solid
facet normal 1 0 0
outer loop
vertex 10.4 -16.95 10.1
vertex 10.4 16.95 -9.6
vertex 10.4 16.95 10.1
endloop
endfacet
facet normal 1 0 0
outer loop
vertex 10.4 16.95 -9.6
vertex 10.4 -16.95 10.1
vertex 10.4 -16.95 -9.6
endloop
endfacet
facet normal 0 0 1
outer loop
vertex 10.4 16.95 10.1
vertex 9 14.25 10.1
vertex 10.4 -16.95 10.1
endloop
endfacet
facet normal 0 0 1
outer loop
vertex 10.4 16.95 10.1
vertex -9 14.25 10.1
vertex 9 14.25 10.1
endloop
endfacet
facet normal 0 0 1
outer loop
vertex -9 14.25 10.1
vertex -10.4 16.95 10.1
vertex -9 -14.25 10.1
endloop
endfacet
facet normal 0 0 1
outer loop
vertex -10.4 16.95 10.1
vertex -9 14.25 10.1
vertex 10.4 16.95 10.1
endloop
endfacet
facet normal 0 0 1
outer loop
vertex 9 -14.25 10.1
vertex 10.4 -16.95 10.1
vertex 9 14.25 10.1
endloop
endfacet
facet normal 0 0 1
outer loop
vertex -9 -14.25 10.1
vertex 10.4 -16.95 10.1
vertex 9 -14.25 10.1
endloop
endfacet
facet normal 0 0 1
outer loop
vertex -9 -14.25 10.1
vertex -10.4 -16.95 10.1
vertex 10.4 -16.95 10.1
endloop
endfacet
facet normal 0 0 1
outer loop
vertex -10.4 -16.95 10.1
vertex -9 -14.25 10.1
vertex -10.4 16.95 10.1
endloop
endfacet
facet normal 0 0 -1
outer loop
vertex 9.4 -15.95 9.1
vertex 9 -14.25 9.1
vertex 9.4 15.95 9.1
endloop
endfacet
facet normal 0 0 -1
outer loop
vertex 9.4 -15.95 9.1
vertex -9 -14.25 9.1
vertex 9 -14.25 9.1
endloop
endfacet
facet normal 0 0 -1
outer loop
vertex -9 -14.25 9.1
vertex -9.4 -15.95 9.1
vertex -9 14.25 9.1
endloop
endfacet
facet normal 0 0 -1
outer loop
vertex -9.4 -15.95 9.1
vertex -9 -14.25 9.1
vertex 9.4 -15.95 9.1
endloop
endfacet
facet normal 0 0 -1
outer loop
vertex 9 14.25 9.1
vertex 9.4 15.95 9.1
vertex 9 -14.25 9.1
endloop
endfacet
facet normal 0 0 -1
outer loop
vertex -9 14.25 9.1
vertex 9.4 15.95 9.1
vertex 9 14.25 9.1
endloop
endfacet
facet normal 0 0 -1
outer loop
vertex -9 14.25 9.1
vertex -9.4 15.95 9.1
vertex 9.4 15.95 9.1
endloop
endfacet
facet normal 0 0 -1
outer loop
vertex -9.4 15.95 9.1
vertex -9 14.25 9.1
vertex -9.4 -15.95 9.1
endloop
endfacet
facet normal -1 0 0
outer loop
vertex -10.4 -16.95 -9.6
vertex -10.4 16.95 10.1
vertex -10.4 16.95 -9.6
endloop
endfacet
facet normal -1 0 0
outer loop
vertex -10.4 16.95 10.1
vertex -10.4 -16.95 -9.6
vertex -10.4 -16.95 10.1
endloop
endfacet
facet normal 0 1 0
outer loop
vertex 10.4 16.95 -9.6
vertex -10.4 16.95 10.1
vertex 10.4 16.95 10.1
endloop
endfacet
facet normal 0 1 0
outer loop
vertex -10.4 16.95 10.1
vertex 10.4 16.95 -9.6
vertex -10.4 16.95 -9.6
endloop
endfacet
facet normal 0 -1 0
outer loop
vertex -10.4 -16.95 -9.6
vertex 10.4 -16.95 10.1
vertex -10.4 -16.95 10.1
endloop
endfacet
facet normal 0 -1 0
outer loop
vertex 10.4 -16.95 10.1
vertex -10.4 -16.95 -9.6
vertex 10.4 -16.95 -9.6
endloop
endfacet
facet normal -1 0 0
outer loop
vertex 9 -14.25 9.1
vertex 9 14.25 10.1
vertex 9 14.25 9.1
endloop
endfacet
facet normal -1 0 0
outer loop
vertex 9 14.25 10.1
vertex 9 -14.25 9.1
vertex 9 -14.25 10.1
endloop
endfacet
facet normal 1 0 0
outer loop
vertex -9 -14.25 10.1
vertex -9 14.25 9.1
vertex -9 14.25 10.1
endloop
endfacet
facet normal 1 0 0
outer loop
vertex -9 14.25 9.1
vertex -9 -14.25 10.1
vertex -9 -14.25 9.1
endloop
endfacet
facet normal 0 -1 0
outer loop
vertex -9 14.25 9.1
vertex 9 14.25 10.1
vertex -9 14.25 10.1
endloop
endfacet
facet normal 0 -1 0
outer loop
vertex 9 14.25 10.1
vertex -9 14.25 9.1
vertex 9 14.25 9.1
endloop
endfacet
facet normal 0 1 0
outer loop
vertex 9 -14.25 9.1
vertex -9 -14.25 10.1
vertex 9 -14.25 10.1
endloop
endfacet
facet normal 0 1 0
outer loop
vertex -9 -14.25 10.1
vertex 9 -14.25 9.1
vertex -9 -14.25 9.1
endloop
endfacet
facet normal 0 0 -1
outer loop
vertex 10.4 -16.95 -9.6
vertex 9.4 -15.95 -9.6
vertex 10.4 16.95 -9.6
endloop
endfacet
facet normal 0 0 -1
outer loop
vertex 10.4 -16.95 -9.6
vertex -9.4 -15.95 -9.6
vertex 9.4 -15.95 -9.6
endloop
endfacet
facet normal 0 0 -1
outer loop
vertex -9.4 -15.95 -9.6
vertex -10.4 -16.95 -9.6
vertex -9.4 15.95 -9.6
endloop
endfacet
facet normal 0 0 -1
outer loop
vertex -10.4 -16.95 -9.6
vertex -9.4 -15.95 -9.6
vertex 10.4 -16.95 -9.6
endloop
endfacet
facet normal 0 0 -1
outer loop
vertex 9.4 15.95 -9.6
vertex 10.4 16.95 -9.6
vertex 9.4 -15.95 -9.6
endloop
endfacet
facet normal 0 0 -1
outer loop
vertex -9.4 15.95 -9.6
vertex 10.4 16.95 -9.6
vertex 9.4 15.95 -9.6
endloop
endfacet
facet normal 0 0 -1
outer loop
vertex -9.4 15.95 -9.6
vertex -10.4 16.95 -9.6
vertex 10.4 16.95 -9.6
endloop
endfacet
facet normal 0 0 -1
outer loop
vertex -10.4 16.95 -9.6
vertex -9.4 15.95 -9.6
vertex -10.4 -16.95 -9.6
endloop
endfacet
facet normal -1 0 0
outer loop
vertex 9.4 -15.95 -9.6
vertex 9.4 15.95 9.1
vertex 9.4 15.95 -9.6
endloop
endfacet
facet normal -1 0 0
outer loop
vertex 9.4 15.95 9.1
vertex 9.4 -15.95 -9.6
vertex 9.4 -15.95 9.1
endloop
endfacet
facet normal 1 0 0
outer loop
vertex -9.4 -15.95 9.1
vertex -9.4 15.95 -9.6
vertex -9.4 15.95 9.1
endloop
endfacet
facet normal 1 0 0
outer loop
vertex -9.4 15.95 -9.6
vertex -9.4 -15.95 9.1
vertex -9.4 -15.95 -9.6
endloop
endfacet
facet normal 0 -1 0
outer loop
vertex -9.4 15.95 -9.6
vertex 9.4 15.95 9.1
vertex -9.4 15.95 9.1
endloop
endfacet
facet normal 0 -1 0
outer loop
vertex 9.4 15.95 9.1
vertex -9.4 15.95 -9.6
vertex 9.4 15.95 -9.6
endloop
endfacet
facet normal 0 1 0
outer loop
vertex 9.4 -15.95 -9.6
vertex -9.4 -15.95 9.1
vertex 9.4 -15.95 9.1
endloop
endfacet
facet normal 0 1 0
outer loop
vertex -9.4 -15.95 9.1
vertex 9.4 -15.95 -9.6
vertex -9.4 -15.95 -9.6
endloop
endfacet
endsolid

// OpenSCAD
module switch()
{
	union()
	{
	translate([0, 0, 19.2/2])
	difference()
	{
		cube([20.8,33.9, 1],true);
		cube([18, 28.5, 1.5], true);
	}
	difference()
	{
		cube([20.8, 33.9, 19.2], true);
		cube([18.8, 31.9, 21], true);
	}
	}
}

switch();
